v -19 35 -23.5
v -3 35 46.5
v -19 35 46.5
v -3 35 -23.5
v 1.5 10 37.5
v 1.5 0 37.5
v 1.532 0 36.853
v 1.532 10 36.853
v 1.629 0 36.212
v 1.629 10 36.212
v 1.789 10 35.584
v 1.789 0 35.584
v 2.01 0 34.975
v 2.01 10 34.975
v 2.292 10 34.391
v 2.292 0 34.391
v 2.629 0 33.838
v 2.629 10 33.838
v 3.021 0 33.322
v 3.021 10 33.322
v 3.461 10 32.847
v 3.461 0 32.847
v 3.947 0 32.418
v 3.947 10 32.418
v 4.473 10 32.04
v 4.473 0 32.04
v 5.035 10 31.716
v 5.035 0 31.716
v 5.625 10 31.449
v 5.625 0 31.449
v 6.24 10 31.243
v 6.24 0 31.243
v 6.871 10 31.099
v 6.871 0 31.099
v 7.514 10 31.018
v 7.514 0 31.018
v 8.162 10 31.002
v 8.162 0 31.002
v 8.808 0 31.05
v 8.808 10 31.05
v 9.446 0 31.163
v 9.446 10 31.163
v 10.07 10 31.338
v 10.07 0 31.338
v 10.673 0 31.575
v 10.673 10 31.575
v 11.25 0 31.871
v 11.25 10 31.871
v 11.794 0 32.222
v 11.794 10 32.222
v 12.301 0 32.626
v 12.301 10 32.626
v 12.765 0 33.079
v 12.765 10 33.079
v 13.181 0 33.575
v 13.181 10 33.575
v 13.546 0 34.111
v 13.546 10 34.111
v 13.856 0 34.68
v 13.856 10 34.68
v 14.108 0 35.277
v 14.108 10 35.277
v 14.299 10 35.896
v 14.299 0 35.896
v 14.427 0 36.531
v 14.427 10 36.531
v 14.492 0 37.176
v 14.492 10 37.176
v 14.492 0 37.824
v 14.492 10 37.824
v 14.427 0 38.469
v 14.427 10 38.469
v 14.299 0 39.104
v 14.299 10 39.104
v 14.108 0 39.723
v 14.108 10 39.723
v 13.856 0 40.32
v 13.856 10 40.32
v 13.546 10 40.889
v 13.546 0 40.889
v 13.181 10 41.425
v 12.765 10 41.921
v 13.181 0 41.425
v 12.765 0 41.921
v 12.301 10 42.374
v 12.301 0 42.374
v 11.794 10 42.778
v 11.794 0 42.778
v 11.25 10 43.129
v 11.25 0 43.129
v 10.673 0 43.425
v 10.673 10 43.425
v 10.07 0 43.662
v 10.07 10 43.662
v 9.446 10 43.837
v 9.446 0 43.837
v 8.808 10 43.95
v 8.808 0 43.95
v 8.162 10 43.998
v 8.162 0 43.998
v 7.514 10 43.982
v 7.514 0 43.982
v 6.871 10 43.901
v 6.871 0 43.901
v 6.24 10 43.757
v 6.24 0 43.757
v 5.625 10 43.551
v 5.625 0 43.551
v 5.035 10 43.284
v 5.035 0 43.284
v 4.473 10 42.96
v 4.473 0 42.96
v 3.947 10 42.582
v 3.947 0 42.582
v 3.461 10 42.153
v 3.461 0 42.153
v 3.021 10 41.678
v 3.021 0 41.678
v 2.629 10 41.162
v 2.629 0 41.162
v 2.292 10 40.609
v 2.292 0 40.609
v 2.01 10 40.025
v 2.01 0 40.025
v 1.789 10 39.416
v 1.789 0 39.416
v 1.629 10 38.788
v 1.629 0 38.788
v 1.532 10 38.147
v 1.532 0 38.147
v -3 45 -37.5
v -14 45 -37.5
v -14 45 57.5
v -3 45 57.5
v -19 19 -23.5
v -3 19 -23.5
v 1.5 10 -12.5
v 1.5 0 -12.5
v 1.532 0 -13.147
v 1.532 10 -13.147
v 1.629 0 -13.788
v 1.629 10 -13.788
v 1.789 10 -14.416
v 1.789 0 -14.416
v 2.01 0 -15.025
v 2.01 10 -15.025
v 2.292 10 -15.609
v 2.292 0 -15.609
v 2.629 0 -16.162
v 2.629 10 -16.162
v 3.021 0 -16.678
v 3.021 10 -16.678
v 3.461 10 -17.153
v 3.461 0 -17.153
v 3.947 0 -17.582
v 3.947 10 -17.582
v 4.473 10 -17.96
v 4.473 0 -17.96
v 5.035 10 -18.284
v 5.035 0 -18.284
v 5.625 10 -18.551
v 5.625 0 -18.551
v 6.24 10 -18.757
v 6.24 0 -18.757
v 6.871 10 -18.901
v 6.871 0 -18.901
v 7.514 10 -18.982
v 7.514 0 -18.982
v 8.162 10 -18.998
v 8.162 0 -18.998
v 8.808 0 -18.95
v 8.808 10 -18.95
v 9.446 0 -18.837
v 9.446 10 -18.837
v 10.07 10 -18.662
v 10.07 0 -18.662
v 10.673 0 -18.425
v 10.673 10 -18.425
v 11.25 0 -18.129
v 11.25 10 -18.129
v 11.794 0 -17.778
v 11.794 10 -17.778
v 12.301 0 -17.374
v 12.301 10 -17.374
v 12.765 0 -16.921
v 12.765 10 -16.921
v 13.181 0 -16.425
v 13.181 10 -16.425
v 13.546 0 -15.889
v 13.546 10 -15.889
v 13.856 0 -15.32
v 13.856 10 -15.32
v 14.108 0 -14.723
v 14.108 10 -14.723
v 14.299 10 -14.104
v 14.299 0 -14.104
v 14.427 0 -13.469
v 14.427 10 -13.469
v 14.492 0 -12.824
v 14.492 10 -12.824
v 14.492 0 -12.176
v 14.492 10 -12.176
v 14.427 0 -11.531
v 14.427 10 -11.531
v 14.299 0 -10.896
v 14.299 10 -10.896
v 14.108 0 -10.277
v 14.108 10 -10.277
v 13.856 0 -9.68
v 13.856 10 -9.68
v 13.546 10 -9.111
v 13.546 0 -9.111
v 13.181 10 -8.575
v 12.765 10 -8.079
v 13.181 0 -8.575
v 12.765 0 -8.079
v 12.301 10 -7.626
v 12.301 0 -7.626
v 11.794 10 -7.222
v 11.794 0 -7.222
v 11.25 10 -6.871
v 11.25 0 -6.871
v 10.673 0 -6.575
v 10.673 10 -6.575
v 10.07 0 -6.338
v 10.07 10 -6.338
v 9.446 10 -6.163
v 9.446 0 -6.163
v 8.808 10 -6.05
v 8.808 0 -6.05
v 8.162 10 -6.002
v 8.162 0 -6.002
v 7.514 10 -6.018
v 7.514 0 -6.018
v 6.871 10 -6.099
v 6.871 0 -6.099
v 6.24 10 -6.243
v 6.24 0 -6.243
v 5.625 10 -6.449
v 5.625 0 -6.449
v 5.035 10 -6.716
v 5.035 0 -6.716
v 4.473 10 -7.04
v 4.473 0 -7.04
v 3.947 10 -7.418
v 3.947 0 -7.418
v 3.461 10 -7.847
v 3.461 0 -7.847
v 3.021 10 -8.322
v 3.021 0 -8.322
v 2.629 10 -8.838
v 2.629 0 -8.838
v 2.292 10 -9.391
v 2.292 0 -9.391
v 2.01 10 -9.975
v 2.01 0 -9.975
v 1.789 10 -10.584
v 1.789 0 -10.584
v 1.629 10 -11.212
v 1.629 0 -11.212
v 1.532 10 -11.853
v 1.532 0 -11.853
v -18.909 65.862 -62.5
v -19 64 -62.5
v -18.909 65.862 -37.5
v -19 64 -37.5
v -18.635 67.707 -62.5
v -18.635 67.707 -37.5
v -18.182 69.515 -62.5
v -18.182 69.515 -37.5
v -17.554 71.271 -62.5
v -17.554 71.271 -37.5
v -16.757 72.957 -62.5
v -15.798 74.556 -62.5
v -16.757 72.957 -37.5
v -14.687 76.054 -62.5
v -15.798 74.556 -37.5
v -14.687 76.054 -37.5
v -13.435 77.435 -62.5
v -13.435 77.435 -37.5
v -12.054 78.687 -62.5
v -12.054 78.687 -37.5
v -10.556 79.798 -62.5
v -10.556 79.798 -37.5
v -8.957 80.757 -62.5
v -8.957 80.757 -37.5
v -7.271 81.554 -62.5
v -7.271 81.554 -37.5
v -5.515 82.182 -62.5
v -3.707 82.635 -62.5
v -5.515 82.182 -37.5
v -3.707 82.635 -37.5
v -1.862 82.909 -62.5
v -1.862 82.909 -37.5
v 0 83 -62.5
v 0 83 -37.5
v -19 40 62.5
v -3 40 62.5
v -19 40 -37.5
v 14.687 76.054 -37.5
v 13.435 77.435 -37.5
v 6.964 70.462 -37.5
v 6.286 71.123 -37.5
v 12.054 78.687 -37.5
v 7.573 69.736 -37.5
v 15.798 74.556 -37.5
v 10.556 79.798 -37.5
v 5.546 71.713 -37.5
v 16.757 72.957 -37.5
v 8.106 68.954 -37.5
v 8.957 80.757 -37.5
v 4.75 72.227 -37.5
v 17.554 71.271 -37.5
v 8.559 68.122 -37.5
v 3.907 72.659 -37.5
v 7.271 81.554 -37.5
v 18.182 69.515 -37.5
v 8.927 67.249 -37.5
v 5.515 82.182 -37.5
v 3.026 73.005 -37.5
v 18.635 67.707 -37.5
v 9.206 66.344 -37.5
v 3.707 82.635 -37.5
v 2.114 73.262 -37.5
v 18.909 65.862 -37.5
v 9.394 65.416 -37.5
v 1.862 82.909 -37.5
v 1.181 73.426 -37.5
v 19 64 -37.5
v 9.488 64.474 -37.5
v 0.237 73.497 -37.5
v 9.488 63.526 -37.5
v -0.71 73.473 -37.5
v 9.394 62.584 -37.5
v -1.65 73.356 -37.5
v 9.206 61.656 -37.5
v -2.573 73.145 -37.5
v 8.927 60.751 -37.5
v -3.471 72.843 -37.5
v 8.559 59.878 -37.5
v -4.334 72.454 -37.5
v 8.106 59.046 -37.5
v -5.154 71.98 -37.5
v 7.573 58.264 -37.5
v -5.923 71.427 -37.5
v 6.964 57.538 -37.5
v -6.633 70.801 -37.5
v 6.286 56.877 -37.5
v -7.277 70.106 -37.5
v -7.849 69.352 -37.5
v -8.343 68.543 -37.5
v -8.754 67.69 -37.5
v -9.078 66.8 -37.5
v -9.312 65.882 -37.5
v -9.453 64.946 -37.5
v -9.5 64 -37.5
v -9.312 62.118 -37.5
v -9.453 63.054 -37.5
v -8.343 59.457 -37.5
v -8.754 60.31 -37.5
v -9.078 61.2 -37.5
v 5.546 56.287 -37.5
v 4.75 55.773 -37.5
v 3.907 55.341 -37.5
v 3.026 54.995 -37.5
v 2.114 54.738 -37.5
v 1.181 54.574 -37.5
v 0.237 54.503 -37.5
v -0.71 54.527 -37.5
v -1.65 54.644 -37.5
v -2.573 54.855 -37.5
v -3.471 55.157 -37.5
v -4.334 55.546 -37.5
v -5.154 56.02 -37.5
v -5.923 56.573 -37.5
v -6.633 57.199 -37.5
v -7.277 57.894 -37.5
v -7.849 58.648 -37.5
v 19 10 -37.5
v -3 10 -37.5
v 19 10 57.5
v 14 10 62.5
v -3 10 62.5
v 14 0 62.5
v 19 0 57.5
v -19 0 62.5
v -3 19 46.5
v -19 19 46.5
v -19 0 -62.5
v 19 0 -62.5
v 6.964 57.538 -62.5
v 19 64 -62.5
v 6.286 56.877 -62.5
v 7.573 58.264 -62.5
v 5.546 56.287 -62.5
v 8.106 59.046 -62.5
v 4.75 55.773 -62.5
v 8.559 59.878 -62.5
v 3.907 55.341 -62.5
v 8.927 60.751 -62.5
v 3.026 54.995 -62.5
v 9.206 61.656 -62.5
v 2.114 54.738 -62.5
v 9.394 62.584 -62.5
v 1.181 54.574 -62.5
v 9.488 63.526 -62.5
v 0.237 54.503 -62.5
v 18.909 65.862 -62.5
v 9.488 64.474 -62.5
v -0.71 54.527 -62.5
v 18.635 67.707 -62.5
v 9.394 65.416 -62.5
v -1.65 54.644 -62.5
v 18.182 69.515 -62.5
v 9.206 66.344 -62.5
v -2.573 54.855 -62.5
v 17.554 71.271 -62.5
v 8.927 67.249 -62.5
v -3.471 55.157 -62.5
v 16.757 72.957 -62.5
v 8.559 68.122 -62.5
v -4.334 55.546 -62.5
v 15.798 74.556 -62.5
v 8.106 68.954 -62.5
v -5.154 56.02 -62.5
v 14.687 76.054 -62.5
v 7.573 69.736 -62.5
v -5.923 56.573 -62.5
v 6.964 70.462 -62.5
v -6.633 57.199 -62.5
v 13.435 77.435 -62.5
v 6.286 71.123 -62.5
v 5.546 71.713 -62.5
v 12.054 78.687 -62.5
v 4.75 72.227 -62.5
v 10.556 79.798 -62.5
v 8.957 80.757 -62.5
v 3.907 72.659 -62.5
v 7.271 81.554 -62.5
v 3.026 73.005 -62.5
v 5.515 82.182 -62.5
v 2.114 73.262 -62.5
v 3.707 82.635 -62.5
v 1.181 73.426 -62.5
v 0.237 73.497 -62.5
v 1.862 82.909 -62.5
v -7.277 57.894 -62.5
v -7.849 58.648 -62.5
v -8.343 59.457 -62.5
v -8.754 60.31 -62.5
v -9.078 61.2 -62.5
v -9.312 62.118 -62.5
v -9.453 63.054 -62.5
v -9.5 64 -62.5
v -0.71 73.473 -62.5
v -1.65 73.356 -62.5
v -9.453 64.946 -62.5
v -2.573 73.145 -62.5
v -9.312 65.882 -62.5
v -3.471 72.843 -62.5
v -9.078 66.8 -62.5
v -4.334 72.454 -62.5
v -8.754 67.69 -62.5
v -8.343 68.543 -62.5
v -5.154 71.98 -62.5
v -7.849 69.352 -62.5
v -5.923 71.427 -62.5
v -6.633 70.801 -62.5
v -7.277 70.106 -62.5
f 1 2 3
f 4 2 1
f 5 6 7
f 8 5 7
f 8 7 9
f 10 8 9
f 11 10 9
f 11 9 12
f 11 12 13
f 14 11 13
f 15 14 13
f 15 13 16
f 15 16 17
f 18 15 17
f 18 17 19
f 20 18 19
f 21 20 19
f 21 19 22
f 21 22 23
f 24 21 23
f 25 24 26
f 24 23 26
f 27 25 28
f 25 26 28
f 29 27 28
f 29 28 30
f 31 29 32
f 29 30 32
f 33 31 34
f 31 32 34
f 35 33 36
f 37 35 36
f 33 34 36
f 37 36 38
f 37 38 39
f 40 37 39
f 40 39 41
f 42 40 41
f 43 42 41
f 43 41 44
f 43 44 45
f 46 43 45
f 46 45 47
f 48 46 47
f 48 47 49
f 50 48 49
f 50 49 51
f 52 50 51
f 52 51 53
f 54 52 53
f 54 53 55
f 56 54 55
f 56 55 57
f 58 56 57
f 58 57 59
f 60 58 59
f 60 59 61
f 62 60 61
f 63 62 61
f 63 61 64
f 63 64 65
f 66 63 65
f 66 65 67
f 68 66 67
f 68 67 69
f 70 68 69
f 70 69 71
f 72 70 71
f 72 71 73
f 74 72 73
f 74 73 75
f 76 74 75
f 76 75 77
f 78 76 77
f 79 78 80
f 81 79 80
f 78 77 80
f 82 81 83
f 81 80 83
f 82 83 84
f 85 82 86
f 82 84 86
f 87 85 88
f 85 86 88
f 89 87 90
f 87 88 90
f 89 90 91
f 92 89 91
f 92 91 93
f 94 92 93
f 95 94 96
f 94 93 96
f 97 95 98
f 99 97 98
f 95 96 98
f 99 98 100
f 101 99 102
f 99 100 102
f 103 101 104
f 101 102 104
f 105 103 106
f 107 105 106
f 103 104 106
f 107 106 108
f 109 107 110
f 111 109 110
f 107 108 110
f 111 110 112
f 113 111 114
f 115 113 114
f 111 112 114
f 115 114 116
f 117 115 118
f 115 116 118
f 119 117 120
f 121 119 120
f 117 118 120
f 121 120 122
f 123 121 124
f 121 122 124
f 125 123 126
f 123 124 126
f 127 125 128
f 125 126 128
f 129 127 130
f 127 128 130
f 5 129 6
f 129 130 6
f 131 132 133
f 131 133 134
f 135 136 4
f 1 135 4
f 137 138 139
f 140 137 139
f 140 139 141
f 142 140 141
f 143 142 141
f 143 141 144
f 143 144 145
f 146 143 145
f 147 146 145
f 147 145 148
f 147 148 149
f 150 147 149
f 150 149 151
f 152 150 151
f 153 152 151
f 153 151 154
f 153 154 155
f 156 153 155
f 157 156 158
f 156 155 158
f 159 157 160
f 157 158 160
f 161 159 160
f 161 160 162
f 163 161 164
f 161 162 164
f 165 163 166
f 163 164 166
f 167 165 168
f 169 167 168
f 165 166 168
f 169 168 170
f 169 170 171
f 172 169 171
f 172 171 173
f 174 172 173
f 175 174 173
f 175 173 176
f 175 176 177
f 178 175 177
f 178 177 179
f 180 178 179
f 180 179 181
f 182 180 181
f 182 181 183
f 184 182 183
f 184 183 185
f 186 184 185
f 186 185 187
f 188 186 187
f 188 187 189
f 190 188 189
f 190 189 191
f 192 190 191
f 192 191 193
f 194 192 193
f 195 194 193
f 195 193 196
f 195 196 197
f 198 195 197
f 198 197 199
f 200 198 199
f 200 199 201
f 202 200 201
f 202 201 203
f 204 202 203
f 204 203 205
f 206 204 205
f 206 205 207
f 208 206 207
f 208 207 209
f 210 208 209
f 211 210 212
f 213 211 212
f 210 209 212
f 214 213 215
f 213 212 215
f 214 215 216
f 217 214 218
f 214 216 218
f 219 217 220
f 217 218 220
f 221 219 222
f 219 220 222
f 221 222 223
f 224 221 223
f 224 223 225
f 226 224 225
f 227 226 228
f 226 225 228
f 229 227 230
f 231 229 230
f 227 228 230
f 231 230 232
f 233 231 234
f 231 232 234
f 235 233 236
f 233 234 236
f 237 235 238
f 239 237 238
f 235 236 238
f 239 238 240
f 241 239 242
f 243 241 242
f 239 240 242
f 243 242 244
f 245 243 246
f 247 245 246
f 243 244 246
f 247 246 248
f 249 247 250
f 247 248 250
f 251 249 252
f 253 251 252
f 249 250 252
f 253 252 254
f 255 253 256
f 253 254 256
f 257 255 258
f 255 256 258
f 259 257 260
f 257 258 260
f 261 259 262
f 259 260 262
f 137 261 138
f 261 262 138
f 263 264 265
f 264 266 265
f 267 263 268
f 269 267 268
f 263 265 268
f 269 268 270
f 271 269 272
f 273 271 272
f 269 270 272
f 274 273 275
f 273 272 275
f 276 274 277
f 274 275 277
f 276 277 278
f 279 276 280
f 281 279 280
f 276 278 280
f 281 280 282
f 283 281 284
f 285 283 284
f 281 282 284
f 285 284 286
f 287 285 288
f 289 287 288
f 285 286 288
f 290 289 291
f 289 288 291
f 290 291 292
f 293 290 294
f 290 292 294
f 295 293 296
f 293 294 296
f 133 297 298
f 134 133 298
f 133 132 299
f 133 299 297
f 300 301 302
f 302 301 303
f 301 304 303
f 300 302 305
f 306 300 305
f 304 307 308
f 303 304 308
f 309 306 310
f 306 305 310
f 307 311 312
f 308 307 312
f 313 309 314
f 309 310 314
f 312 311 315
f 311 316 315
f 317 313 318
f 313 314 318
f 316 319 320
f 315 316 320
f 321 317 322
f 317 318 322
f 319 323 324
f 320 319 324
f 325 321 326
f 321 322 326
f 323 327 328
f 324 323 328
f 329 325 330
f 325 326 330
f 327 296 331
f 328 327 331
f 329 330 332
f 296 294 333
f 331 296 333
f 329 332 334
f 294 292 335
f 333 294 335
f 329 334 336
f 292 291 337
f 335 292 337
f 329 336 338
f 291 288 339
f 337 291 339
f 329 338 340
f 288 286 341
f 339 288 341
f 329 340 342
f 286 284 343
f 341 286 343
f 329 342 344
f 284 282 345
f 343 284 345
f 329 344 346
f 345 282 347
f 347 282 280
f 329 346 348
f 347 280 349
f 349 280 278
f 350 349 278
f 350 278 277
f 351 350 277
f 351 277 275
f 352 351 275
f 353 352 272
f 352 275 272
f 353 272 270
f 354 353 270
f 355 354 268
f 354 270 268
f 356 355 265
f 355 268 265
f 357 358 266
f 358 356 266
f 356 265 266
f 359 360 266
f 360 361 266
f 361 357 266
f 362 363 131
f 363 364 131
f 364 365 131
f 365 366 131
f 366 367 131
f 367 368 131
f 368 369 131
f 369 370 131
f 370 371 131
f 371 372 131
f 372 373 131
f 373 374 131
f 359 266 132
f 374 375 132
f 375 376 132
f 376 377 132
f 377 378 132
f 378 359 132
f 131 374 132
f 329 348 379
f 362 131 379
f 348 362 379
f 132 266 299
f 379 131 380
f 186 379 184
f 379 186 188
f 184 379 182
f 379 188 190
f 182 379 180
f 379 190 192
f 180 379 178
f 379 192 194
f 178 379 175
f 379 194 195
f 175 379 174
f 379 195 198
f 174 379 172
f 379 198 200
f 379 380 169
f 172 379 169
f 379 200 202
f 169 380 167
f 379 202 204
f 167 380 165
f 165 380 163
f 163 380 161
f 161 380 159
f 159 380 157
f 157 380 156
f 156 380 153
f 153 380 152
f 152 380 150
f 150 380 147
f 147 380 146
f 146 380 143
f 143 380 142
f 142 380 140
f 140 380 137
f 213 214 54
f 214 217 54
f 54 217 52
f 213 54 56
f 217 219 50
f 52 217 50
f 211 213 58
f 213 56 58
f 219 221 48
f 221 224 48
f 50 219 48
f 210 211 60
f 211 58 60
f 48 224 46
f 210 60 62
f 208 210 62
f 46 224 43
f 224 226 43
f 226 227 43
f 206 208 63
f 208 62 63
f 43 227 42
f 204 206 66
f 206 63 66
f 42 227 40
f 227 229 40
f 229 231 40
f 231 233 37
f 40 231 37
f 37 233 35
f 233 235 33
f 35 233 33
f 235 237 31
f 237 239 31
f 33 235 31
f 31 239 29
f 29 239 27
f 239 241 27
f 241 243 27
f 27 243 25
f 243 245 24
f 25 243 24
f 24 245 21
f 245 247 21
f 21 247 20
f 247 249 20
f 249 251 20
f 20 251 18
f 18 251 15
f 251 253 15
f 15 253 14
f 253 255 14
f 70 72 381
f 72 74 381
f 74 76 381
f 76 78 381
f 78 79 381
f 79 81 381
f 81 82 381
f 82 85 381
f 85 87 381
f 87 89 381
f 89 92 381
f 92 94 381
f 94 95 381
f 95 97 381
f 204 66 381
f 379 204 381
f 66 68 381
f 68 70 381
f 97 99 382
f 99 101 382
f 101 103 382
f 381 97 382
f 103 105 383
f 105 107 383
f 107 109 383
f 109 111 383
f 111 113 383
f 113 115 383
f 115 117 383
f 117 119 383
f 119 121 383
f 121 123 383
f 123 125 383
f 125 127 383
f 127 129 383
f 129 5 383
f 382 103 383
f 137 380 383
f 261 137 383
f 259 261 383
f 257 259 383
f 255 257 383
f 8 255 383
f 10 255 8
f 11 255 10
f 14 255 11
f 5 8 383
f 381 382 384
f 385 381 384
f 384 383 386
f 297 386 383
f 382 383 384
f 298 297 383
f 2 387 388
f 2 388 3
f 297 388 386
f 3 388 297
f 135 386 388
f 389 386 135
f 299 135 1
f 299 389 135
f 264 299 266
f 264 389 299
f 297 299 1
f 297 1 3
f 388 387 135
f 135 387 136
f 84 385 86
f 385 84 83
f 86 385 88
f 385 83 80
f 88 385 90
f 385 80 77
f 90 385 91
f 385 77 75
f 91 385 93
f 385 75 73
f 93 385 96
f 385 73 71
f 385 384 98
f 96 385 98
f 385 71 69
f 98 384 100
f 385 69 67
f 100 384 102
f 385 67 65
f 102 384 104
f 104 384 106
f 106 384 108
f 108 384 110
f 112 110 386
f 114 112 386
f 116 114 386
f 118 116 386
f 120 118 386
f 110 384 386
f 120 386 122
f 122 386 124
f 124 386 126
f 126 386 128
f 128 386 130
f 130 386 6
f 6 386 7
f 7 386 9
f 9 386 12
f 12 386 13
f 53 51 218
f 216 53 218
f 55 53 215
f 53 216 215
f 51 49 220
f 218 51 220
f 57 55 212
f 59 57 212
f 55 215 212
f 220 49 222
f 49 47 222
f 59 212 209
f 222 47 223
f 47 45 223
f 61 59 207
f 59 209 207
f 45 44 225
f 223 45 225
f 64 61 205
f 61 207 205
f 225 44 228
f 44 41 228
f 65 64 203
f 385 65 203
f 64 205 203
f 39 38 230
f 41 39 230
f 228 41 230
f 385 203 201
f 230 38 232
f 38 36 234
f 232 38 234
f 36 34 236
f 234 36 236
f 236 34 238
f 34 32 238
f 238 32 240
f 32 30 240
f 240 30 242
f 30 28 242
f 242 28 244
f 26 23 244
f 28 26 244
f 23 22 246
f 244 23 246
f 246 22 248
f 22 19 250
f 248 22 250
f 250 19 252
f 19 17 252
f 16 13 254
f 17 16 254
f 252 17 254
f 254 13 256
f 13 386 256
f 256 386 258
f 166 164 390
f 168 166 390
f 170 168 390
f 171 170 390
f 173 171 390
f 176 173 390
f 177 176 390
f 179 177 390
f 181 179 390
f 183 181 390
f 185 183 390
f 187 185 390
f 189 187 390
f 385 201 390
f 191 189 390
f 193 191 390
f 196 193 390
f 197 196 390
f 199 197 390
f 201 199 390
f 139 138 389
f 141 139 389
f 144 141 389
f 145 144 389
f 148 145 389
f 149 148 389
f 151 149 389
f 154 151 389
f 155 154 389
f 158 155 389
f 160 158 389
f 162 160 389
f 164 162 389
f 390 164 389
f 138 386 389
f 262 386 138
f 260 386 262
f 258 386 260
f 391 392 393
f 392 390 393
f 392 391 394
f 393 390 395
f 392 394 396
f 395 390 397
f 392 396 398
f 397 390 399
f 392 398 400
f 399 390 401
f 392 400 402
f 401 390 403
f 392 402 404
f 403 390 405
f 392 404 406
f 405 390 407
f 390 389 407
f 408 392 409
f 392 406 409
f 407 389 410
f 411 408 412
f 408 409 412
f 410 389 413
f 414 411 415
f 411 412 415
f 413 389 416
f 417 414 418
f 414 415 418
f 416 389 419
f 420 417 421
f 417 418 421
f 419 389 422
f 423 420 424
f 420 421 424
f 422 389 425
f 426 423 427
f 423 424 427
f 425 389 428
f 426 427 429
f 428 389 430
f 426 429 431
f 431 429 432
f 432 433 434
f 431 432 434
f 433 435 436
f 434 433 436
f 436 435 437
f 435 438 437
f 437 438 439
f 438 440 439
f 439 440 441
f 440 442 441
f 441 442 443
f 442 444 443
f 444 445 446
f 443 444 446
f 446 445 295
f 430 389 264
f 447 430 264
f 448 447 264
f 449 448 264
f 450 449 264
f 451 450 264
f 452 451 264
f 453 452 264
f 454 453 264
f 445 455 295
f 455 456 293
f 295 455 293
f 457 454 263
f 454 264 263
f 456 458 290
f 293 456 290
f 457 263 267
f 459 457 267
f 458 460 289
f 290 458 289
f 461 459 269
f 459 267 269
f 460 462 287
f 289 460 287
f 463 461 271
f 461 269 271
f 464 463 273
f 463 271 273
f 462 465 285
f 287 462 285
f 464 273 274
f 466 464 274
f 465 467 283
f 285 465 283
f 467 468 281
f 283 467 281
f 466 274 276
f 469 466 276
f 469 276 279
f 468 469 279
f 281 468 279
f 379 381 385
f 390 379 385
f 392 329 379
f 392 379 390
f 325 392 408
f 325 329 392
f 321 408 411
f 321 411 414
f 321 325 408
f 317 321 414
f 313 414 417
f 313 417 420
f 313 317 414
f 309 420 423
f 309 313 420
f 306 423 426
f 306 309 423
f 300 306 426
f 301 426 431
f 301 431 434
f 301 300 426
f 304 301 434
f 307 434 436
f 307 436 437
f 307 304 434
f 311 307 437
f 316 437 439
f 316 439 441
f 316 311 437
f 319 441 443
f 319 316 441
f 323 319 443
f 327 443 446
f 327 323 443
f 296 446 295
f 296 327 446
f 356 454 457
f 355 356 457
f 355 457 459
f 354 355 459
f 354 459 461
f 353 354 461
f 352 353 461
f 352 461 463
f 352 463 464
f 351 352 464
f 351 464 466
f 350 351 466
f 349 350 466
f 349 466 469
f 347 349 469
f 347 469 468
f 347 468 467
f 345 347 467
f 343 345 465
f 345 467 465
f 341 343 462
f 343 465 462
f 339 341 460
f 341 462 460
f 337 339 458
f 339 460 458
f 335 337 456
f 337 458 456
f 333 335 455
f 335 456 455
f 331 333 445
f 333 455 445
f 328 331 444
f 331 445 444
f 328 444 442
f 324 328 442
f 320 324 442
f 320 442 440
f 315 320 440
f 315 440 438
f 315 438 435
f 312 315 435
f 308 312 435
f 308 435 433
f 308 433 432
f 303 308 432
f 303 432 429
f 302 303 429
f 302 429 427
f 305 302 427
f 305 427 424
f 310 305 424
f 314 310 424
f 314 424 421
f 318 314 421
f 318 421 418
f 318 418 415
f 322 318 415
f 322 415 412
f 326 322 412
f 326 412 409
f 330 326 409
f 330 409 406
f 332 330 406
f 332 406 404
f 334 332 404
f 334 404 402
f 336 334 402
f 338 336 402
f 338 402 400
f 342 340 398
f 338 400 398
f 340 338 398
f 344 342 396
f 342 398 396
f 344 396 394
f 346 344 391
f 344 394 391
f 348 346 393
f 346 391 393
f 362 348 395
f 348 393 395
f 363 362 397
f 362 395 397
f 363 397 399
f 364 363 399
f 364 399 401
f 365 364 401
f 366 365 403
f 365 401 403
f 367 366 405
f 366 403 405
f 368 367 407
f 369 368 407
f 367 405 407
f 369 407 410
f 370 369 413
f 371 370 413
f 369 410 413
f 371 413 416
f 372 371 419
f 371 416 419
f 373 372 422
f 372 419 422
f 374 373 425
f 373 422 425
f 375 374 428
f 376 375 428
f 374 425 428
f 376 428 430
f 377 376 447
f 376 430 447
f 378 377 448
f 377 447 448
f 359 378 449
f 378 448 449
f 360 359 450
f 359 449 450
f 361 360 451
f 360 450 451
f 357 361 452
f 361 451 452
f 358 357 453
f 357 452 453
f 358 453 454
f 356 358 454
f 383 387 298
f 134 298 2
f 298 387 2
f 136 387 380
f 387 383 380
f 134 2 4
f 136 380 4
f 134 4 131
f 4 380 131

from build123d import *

# Parameters (mm, degrees)
BOSS_EXTRUDE1_DEPTH      = 19
BOSS_EXTRUDE1_DEPTH_BACK = 19
SKETCH2_W                = 16
SKETCH2_H                = 35
BOSS_EXTRUDE2_DEPTH      = 100
FILLET1_R                = 19
HOLE1_D                  = 19
CHAMFER1_SIZE            = 5
CHAMFER2_SIZE            = 5
SKETCH6_W                = 70
SKETCH6_H                = 16
CUT_EXTRUDE1_DEPTH       = 19
HOLE2_D                  = 13


with BuildPart() as part:
    # Sketch1 → Boss-Extrude1 (new, two sides: drawn at the far end of the back side and taken through both)
    with BuildSketch(Plane(origin=(0, 0, 0), x_dir=(0, 0, -1), z_dir=(1, 0, 0)).offset(-BOSS_EXTRUDE1_DEPTH_BACK)):
        Polygon((-62.5, 0), (62.5, 0), (62.5, 83), (37.5, 83), (37.5, 10), (-62.5, 10), align=None)
    extrude(amount=BOSS_EXTRUDE1_DEPTH + BOSS_EXTRUDE1_DEPTH_BACK)

    # Sketch2 → Boss-Extrude2 (add)
    with BuildSketch(Plane.XY.offset(-37.5)):
        with Locations((-11, 27.5)):
            Rectangle(SKETCH2_W, SKETCH2_H)
    extrude(amount=BOSS_EXTRUDE2_DEPTH)

    # Fillet1
    fillet1_edges = [part.edges().sort_by_distance(p)[0] for p in [
        (-19, 83, -50),
        (19, 83, -50),
    ]]
    fillet(fillet1_edges, radius=FILLET1_R - 0.0001)  # a hair under: the kernel refuses the full size

    # Hole1 (through all)
    with Locations(Plane.XY.offset(-37.5)):
        with Locations((0, 64)):
            Hole(HOLE1_D / 2)

    # Chamfer1
    chamfer1_edges = [part.edges().sort_by_distance(p)[0] for p in [
        (-19, 45, 12.5),
        (-11, 45, 62.5),
    ]]
    chamfer(chamfer1_edges, length=CHAMFER1_SIZE)

    # Chamfer2
    chamfer2_edges = [part.edges().sort_by_distance(p)[0] for p in [
        (19, 5, 62.5),
    ]]
    chamfer(chamfer2_edges, length=CHAMFER2_SIZE)

    # Sketch6 → Cut-Extrude1 (cut)
    with BuildSketch(Plane(origin=(-3, 0, 0), x_dir=(0, 0, -1), z_dir=(1, 0, 0))):
        with Locations((-11.5, 27)):
            Rectangle(SKETCH6_W, SKETCH6_H)
    extrude(amount=-CUT_EXTRUDE1_DEPTH, mode=Mode.SUBTRACT)

    # Hole2 (through all)
    with Locations(Plane(origin=(0, 10, 0), x_dir=(1, 0, 0), z_dir=(0, 1, 0))):
        with Locations((8, 12.5), (8, -37.5)):
            Hole(HOLE2_D / 2)


solid = part.part
